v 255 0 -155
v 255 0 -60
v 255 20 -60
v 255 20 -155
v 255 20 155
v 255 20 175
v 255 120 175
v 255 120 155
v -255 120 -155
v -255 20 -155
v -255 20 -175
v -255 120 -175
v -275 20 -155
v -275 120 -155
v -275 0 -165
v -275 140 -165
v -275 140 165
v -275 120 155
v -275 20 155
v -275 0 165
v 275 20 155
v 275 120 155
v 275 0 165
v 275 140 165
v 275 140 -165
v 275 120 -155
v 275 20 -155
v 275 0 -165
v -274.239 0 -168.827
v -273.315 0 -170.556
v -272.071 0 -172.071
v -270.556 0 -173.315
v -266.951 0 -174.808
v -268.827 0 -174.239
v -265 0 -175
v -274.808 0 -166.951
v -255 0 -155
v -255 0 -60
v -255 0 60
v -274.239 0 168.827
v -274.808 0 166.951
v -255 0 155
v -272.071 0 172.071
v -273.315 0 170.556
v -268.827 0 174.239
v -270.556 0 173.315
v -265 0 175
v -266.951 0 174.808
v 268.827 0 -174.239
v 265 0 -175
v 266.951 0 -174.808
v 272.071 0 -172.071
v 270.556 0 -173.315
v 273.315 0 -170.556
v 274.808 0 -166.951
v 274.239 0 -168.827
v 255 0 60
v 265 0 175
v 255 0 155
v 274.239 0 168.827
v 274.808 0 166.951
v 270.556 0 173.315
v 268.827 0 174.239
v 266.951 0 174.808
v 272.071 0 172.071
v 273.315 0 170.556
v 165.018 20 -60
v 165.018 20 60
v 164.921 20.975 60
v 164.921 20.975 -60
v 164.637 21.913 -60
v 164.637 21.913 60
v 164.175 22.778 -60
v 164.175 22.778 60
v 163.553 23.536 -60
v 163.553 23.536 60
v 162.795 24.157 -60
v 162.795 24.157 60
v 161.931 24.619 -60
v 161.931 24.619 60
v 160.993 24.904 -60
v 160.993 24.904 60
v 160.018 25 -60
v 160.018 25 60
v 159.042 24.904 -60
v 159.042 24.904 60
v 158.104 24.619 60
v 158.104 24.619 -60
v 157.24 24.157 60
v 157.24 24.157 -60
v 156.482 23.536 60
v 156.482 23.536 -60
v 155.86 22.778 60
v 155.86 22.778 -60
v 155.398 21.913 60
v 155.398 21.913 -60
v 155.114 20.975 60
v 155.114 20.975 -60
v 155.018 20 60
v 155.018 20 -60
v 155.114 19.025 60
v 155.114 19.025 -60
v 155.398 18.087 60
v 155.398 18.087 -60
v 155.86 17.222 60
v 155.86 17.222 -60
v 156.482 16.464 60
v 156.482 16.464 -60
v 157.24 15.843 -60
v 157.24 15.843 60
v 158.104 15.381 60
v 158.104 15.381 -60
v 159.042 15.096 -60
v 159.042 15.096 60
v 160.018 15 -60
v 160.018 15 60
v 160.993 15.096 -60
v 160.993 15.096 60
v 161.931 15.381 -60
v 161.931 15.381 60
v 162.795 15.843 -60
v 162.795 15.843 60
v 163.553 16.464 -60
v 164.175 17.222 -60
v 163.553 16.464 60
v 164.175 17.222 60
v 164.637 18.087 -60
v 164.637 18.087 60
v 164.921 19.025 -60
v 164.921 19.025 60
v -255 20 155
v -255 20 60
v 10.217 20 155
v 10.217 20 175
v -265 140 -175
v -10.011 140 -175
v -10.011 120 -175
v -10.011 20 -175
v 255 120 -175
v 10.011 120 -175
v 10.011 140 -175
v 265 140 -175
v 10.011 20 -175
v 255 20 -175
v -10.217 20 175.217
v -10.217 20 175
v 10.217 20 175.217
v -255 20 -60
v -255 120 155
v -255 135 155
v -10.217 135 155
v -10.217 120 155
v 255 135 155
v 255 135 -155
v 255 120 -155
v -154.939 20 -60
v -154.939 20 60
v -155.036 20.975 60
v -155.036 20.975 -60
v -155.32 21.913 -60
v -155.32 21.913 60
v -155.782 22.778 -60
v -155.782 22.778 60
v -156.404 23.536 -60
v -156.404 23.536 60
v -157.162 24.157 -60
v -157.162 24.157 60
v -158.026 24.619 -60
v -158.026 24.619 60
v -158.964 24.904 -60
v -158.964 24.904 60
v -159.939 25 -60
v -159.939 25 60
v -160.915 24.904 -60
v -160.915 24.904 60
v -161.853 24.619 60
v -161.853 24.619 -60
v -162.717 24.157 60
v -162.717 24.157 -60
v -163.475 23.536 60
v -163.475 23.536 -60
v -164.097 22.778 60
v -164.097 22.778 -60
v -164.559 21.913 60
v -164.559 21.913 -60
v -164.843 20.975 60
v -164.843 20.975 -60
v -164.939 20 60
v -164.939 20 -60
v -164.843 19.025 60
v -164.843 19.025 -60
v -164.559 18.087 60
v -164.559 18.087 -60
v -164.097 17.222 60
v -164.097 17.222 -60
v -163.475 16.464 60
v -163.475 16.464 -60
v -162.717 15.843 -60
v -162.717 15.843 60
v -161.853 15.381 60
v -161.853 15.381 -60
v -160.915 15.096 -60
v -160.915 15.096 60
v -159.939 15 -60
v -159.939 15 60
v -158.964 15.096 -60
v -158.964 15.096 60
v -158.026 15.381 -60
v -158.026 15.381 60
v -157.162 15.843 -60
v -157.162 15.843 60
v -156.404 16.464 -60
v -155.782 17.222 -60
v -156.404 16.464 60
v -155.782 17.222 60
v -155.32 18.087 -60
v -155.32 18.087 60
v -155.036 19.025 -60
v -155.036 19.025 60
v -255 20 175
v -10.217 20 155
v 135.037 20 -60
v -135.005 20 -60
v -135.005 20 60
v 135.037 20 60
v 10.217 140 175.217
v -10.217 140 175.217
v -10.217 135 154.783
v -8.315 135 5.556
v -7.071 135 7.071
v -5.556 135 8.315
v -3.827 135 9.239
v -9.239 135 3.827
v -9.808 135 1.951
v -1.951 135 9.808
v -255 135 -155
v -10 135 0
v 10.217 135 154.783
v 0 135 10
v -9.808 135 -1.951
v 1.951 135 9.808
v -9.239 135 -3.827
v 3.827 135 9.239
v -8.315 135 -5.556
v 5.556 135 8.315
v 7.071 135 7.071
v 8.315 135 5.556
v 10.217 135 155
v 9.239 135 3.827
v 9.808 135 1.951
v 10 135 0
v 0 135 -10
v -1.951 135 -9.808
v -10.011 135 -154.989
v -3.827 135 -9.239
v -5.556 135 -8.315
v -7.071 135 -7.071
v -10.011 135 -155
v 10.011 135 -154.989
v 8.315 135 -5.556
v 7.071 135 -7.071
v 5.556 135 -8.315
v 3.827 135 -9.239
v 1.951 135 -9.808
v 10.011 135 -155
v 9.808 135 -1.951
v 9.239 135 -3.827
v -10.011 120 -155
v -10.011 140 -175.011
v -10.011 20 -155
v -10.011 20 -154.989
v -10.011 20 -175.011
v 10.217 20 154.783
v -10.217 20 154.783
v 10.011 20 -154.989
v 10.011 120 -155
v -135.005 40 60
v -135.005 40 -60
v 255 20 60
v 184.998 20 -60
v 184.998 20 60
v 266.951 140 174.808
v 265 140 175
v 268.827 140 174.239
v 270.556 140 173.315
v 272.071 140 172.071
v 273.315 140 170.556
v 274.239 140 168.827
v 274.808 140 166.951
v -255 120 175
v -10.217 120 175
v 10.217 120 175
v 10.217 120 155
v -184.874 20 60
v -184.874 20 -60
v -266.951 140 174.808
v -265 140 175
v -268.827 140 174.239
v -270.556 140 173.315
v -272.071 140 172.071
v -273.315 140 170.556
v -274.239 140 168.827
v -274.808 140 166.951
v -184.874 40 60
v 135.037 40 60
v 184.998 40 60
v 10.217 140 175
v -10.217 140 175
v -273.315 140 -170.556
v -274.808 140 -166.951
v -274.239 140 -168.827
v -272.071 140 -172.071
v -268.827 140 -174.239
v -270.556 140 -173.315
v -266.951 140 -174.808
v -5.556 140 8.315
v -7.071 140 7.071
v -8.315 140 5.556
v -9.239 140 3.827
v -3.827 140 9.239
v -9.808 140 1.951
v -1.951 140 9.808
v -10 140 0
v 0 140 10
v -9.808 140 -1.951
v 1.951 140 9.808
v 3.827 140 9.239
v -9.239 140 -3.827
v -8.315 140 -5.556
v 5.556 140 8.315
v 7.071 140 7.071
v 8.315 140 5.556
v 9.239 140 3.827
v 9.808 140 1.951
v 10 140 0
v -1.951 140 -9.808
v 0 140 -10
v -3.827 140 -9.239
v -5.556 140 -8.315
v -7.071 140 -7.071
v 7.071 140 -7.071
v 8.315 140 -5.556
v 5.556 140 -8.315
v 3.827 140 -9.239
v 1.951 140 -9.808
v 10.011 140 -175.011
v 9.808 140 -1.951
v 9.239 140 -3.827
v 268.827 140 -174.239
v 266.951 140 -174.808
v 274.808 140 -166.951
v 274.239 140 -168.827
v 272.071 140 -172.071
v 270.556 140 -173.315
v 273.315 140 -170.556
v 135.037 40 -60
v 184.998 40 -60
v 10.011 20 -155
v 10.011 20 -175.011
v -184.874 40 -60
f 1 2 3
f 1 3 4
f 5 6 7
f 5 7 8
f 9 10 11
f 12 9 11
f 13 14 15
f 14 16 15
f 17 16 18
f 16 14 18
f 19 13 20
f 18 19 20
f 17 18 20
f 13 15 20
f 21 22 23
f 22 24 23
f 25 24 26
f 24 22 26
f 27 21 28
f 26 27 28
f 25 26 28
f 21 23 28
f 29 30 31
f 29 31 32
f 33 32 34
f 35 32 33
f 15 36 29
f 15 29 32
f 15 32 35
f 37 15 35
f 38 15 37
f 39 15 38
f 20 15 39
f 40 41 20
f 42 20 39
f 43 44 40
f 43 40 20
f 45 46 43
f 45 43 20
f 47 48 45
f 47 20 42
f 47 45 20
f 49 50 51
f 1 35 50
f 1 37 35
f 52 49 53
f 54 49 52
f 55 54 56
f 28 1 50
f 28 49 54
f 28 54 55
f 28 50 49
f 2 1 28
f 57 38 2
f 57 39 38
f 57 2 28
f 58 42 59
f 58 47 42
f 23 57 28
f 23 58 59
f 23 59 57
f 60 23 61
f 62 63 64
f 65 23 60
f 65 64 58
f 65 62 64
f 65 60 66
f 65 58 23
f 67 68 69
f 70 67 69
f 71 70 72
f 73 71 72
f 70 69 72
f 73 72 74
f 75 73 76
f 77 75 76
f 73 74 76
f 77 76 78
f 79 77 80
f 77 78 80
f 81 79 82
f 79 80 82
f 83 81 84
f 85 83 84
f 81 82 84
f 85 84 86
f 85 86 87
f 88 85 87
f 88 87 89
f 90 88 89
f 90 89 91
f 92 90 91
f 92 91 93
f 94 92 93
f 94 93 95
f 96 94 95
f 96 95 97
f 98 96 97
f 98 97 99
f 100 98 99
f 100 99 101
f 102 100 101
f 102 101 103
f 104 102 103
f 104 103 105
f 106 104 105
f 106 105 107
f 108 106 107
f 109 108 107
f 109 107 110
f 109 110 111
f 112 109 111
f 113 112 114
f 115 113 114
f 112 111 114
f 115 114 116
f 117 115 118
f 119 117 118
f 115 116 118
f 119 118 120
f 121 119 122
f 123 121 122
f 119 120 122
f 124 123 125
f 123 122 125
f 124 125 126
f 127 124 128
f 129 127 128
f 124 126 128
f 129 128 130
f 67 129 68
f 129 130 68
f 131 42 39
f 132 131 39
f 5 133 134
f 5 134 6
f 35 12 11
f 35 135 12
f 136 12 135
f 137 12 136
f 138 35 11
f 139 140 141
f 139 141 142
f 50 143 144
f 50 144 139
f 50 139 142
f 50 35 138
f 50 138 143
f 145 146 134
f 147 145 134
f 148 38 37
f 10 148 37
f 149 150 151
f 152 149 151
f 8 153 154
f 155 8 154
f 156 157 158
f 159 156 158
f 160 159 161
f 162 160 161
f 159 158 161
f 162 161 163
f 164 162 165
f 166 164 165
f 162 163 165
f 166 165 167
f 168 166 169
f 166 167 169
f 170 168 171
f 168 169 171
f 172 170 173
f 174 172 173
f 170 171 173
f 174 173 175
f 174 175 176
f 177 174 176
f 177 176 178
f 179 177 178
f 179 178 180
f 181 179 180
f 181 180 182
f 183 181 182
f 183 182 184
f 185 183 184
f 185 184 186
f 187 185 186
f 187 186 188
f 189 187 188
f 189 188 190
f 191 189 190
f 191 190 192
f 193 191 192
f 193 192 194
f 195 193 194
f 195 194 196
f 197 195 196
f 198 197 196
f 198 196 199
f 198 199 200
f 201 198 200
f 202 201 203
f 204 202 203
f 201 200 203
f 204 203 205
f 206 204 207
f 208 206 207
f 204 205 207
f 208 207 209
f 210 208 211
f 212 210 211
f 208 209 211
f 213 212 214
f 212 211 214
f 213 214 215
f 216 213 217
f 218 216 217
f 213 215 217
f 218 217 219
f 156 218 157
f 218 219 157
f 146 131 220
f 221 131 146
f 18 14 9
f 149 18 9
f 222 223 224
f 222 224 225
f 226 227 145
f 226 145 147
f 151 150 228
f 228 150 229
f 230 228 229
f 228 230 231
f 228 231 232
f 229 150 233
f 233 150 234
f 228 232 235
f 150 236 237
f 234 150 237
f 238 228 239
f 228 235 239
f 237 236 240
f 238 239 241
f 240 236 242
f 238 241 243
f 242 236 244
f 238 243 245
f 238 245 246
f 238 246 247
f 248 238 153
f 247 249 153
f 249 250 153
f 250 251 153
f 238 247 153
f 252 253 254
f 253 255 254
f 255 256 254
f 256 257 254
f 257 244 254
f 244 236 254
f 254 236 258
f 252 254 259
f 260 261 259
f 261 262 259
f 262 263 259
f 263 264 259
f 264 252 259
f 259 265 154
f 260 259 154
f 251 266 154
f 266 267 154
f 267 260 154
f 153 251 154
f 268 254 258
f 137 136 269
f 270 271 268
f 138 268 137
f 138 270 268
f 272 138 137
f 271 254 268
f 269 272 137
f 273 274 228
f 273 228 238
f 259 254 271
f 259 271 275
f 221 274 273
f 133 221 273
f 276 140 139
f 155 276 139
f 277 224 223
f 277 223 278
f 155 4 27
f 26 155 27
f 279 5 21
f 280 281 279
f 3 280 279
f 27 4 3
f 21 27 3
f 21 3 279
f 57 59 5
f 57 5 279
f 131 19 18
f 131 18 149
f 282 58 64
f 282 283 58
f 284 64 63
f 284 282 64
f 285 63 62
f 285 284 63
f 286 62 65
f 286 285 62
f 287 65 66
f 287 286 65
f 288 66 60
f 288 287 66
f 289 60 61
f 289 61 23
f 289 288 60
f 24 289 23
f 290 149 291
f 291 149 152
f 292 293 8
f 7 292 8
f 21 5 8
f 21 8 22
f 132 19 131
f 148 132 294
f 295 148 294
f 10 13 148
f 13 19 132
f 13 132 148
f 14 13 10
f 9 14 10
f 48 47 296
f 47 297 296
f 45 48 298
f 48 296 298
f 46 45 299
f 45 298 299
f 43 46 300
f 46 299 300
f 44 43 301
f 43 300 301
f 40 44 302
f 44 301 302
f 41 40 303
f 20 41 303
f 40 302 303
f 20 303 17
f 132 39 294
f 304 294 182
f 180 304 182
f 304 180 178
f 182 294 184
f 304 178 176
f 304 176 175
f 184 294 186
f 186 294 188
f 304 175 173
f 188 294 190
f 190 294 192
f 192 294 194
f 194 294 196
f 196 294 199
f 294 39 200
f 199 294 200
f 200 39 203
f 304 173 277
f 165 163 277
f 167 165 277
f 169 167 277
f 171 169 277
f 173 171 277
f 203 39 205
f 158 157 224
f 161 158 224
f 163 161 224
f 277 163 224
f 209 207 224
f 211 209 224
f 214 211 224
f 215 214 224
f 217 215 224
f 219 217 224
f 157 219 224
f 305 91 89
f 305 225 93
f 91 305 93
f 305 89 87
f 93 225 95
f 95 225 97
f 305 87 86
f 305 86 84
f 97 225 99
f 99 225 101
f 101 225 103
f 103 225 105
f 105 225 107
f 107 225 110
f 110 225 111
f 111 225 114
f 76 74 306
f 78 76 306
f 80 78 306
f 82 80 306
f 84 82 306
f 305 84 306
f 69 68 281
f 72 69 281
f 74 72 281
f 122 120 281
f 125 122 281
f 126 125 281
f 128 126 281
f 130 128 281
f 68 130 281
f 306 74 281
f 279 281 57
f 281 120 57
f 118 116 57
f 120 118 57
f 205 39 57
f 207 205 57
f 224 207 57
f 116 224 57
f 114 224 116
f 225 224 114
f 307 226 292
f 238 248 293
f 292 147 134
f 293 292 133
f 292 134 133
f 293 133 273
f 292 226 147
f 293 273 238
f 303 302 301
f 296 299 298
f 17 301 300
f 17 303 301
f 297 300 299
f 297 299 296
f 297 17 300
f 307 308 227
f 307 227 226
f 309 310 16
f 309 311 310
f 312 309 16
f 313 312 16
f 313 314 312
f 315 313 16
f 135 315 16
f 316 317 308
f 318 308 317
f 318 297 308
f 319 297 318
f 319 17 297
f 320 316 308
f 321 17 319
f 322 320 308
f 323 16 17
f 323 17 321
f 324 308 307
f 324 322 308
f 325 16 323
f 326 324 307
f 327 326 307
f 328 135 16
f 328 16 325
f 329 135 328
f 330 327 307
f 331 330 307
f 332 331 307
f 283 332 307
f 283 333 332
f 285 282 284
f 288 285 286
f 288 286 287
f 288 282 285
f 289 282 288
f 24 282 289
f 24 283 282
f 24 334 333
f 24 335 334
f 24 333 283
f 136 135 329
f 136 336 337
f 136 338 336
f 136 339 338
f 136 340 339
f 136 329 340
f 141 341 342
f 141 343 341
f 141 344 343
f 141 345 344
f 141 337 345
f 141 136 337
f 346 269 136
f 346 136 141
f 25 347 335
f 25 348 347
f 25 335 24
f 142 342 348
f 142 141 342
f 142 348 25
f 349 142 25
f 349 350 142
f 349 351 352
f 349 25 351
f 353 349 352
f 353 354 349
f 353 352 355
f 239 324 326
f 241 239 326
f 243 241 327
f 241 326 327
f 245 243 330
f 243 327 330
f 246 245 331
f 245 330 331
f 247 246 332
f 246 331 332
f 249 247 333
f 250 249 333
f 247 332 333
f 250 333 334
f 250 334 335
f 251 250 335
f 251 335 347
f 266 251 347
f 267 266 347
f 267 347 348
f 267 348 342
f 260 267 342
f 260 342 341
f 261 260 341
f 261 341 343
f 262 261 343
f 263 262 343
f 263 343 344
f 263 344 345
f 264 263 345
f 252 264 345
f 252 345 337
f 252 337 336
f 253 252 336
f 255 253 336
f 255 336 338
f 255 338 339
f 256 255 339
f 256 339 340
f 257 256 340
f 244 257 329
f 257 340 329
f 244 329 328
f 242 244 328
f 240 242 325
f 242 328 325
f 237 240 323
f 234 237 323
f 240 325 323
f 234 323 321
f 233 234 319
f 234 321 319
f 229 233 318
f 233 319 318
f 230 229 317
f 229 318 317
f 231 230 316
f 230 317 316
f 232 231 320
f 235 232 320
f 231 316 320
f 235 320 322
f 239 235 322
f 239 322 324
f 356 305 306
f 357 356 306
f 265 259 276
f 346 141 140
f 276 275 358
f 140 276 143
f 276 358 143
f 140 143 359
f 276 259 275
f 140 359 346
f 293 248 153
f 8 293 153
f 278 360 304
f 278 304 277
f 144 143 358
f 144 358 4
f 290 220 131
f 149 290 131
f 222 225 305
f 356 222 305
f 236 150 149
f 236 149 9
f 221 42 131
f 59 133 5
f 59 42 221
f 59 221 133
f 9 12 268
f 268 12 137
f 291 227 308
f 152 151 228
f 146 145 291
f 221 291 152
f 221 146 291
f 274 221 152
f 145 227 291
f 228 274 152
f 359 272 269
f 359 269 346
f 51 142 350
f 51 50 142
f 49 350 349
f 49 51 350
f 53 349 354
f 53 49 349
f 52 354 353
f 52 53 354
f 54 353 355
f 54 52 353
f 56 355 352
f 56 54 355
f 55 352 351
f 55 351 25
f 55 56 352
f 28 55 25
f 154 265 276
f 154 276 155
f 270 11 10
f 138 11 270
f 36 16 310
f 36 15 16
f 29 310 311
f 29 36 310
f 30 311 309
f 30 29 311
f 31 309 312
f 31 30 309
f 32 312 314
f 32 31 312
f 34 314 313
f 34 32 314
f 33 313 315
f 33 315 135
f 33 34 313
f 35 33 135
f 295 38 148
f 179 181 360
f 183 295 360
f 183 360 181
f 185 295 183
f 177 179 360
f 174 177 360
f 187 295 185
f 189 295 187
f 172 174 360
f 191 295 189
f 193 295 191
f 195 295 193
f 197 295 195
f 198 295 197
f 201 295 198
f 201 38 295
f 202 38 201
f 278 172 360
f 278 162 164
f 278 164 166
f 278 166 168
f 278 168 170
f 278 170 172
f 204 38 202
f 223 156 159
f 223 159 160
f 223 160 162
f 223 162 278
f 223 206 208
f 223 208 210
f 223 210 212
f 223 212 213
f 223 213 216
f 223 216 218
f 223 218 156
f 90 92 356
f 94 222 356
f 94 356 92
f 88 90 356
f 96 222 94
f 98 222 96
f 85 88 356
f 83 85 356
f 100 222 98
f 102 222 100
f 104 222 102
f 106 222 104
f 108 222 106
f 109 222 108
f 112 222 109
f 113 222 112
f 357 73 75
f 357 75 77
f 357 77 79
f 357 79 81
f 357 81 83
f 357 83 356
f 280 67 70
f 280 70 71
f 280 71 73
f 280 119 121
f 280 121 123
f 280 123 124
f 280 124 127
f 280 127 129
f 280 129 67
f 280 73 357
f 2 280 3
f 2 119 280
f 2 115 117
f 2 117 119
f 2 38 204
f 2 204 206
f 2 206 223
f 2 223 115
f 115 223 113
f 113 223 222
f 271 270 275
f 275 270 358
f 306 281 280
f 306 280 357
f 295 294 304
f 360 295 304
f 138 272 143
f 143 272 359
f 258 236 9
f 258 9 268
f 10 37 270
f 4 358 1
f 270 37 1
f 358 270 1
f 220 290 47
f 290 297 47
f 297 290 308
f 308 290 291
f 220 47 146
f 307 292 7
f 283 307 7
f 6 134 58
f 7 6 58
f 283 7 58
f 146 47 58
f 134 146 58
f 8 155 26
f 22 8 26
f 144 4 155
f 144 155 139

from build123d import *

# Parameters (mm, degrees)
SKETCH1_W           = 550
SKETCH1_H           = 350
SKETCH1_W_2         = 510
SKETCH1_H_2         = 310
BOSS_EXTRUDE1_DEPTH = 20
SKETCH3_W           = 20
SKETCH3_H           = 20
SKETCH3_W_2         = 20.022451752
SKETCH3_H_2         = 20.022451752
SKETCH3_W_3         = 20.433308148
SKETCH3_H_3         = 20.433308148
BOSS_EXTRUDE2_DEPTH = 120
SKETCH4_W           = 550
SKETCH4_H           = 350
SKETCH4_W_2         = 510
SKETCH4_H_2         = 310
BOSS_EXTRUDE3_DEPTH = 20
SKETCH5_W           = 550
SKETCH5_H           = 350
BOSS_EXTRUDE4_DEPTH = 5
SKETCH6_W           = 550
SKETCH6_H           = 120
BOSS_EXTRUDE5_DEPTH = 20
SKETCH7_W           = 49.868309686
SKETCH7_H           = 40
SKETCH7_W_2         = 49.961884124
BOSS_EXTRUDE6_DEPTH = 120
SKETCH8_R           = 5
CUT_EXTRUDE1_DEPTH  = 181
FILLET1_R           = 10
SKETCH9_R           = 10
CUT_EXTRUDE2_DEPTH  = 43


with BuildPart() as part:
    # Sketch1 → Boss-Extrude1 (new body)
    with BuildSketch(Plane(origin=(0, 0, 0), x_dir=(1, 0, 0), z_dir=(0, 1, 0))):
        Rectangle(SKETCH1_W, SKETCH1_H)
        Rectangle(SKETCH1_W_2, SKETCH1_H_2, mode=Mode.SUBTRACT)
    extrude(amount=BOSS_EXTRUDE1_DEPTH)

    # Sketch3 → Boss-Extrude2 (add)
    with BuildSketch(Plane(origin=(0, 20, 0), x_dir=(1, 0, 0), z_dir=(0, 1, 0))):
        with Locations((-265, 165)):
            Rectangle(SKETCH3_W, SKETCH3_H)
        with Locations((-265, -165)):
            Rectangle(SKETCH3_W, SKETCH3_H)
        with Locations((265, -165)):
            Rectangle(SKETCH3_W, SKETCH3_H)
        with Locations((265, 165)):
            Rectangle(SKETCH3_W, SKETCH3_H)
        with Locations((0, 165)):
            Rectangle(SKETCH3_W_2, SKETCH3_H_2)
        with Locations((0, -165)):
            Rectangle(SKETCH3_W_3, SKETCH3_H_3)
    extrude(amount=BOSS_EXTRUDE2_DEPTH)

    # Sketch4 → Boss-Extrude3 (add)
    with BuildSketch(Plane(origin=(0, 140, 0), x_dir=(1, 0, 0), z_dir=(0, 1, 0))):
        Rectangle(SKETCH4_W, SKETCH4_H)
        Rectangle(SKETCH4_W_2, SKETCH4_H_2, mode=Mode.SUBTRACT)
    extrude(amount=-BOSS_EXTRUDE3_DEPTH)

    # Sketch5 → Boss-Extrude4 (add)
    with BuildSketch(Plane(origin=(0, 140, 0), x_dir=(1, 0, 0), z_dir=(0, 1, 0))):
        Rectangle(SKETCH5_W, SKETCH5_H)
    extrude(amount=-BOSS_EXTRUDE4_DEPTH)

    # Sketch6 → Boss-Extrude5 (add)
    with BuildSketch(Plane.XZ):
        Rectangle(SKETCH6_W, SKETCH6_H)
    extrude(amount=-BOSS_EXTRUDE5_DEPTH)

    # Sketch7 → Boss-Extrude6 (add)
    with BuildSketch(Plane.XY.offset(60)):
        with Locations((-159.939483021, 20)):
            Rectangle(SKETCH7_W, SKETCH7_H)
        with Locations((160.017500796, 20)):
            Rectangle(SKETCH7_W_2, SKETCH7_H)
    extrude(amount=-BOSS_EXTRUDE6_DEPTH)

    # Sketch8 → Cut-Extrude1 (cut)
    with BuildSketch(Plane.XY.offset(60)):
        with Locations((160.017500796, 20)):
            Circle(SKETCH8_R)
        with Locations((-159.939483021, 20)):
            Circle(SKETCH8_R)
    extrude(amount=-CUT_EXTRUDE1_DEPTH, mode=Mode.SUBTRACT)

    # Fillet1
    fillet1_edges = [part.edges().sort_by_distance(p)[0] for p in [
        (275, 70, 175),
        (-275, 70, 175),
        (-275, 70, -175),
        (275, 70, -175),
    ]]
    fillet(fillet1_edges, radius=FILLET1_R)

    # Sketch9 → Cut-Extrude2 (cut)
    with BuildSketch(Plane(origin=(0, 140, 0), x_dir=(1, 0, 0), z_dir=(0, 1, 0))):
        with Locations(Location((0, 0, 0), (0, 0, 270))):
            Circle(SKETCH9_R)
    extrude(amount=-CUT_EXTRUDE2_DEPTH, mode=Mode.SUBTRACT)


solid = part.part
